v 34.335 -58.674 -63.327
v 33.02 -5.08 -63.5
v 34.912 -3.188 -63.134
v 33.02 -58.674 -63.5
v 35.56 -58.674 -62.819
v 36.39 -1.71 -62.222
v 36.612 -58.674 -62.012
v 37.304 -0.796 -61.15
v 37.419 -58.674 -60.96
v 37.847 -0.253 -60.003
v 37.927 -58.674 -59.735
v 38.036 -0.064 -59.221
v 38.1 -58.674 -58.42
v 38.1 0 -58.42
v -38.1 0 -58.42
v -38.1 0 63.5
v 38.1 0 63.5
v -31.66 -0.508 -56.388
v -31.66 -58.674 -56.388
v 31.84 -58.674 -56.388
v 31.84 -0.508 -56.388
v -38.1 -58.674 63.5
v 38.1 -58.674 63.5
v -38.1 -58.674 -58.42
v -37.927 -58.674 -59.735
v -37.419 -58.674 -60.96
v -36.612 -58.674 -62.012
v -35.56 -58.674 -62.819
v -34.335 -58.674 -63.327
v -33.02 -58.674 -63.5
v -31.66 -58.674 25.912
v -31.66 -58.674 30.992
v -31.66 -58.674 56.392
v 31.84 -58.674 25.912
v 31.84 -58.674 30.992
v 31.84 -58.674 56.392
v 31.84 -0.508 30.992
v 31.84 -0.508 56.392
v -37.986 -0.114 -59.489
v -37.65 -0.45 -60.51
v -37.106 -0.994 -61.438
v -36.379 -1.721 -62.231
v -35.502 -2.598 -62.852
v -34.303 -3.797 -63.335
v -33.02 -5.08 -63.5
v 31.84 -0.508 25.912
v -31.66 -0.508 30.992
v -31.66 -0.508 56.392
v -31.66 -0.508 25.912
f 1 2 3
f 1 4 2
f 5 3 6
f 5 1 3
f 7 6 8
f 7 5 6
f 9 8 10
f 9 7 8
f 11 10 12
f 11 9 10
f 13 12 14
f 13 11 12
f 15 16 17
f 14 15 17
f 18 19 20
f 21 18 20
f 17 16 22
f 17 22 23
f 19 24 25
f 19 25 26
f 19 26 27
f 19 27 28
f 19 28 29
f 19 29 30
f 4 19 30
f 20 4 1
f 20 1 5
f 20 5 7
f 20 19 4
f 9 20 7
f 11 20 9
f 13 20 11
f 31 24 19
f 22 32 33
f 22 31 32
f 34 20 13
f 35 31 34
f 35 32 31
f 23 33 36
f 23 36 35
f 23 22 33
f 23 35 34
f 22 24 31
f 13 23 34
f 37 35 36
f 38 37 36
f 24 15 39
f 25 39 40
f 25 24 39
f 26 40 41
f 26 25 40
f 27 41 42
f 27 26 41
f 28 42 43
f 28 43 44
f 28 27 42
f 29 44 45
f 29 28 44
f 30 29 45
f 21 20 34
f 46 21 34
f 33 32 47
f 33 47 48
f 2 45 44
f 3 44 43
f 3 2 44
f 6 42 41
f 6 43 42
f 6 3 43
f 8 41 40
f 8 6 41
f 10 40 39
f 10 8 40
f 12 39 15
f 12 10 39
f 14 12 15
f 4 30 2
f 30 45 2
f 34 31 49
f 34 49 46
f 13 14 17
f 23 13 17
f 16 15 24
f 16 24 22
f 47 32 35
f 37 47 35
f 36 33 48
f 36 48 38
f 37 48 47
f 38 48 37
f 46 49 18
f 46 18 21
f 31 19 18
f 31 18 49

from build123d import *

# Parameters (mm, degrees)
F0_W     = 76.2
F0_H     = 127
F1_DEPTH = 58.674
F2_W     = 63.5
F2_H     = 25.4
F2_H_2   = 82.300099
F3_DEPTH = 58.166
F4_R     = 5.08


with BuildPart() as f1:
    # F0 (on Front) → F1 (new body)
    with BuildSketch(Plane.XZ):
        Rectangle(F0_W, F0_H)
    extrude(amount=F1_DEPTH)

    # F2 (on face) → F3 (cut)
    with BuildSketch(Plane.XZ.offset(58.674)):
        with Locations((0.089581, 43.692099)):
            Rectangle(F2_W, F2_H)
        with Locations((0.089581, -15.237951)):
            Rectangle(F2_W, F2_H_2)
    extrude(amount=-F3_DEPTH, mode=Mode.SUBTRACT)

    # F4
    f4_edges = [f1.edges().sort_by_distance(p)[0] for p in [
        (38.1, -29.337, -63.5),
        (-38.1, -29.337, -63.5),
        (0, 0, -63.5),
    ]]
    fillet(f4_edges, radius=F4_R)


solid = f1.part
